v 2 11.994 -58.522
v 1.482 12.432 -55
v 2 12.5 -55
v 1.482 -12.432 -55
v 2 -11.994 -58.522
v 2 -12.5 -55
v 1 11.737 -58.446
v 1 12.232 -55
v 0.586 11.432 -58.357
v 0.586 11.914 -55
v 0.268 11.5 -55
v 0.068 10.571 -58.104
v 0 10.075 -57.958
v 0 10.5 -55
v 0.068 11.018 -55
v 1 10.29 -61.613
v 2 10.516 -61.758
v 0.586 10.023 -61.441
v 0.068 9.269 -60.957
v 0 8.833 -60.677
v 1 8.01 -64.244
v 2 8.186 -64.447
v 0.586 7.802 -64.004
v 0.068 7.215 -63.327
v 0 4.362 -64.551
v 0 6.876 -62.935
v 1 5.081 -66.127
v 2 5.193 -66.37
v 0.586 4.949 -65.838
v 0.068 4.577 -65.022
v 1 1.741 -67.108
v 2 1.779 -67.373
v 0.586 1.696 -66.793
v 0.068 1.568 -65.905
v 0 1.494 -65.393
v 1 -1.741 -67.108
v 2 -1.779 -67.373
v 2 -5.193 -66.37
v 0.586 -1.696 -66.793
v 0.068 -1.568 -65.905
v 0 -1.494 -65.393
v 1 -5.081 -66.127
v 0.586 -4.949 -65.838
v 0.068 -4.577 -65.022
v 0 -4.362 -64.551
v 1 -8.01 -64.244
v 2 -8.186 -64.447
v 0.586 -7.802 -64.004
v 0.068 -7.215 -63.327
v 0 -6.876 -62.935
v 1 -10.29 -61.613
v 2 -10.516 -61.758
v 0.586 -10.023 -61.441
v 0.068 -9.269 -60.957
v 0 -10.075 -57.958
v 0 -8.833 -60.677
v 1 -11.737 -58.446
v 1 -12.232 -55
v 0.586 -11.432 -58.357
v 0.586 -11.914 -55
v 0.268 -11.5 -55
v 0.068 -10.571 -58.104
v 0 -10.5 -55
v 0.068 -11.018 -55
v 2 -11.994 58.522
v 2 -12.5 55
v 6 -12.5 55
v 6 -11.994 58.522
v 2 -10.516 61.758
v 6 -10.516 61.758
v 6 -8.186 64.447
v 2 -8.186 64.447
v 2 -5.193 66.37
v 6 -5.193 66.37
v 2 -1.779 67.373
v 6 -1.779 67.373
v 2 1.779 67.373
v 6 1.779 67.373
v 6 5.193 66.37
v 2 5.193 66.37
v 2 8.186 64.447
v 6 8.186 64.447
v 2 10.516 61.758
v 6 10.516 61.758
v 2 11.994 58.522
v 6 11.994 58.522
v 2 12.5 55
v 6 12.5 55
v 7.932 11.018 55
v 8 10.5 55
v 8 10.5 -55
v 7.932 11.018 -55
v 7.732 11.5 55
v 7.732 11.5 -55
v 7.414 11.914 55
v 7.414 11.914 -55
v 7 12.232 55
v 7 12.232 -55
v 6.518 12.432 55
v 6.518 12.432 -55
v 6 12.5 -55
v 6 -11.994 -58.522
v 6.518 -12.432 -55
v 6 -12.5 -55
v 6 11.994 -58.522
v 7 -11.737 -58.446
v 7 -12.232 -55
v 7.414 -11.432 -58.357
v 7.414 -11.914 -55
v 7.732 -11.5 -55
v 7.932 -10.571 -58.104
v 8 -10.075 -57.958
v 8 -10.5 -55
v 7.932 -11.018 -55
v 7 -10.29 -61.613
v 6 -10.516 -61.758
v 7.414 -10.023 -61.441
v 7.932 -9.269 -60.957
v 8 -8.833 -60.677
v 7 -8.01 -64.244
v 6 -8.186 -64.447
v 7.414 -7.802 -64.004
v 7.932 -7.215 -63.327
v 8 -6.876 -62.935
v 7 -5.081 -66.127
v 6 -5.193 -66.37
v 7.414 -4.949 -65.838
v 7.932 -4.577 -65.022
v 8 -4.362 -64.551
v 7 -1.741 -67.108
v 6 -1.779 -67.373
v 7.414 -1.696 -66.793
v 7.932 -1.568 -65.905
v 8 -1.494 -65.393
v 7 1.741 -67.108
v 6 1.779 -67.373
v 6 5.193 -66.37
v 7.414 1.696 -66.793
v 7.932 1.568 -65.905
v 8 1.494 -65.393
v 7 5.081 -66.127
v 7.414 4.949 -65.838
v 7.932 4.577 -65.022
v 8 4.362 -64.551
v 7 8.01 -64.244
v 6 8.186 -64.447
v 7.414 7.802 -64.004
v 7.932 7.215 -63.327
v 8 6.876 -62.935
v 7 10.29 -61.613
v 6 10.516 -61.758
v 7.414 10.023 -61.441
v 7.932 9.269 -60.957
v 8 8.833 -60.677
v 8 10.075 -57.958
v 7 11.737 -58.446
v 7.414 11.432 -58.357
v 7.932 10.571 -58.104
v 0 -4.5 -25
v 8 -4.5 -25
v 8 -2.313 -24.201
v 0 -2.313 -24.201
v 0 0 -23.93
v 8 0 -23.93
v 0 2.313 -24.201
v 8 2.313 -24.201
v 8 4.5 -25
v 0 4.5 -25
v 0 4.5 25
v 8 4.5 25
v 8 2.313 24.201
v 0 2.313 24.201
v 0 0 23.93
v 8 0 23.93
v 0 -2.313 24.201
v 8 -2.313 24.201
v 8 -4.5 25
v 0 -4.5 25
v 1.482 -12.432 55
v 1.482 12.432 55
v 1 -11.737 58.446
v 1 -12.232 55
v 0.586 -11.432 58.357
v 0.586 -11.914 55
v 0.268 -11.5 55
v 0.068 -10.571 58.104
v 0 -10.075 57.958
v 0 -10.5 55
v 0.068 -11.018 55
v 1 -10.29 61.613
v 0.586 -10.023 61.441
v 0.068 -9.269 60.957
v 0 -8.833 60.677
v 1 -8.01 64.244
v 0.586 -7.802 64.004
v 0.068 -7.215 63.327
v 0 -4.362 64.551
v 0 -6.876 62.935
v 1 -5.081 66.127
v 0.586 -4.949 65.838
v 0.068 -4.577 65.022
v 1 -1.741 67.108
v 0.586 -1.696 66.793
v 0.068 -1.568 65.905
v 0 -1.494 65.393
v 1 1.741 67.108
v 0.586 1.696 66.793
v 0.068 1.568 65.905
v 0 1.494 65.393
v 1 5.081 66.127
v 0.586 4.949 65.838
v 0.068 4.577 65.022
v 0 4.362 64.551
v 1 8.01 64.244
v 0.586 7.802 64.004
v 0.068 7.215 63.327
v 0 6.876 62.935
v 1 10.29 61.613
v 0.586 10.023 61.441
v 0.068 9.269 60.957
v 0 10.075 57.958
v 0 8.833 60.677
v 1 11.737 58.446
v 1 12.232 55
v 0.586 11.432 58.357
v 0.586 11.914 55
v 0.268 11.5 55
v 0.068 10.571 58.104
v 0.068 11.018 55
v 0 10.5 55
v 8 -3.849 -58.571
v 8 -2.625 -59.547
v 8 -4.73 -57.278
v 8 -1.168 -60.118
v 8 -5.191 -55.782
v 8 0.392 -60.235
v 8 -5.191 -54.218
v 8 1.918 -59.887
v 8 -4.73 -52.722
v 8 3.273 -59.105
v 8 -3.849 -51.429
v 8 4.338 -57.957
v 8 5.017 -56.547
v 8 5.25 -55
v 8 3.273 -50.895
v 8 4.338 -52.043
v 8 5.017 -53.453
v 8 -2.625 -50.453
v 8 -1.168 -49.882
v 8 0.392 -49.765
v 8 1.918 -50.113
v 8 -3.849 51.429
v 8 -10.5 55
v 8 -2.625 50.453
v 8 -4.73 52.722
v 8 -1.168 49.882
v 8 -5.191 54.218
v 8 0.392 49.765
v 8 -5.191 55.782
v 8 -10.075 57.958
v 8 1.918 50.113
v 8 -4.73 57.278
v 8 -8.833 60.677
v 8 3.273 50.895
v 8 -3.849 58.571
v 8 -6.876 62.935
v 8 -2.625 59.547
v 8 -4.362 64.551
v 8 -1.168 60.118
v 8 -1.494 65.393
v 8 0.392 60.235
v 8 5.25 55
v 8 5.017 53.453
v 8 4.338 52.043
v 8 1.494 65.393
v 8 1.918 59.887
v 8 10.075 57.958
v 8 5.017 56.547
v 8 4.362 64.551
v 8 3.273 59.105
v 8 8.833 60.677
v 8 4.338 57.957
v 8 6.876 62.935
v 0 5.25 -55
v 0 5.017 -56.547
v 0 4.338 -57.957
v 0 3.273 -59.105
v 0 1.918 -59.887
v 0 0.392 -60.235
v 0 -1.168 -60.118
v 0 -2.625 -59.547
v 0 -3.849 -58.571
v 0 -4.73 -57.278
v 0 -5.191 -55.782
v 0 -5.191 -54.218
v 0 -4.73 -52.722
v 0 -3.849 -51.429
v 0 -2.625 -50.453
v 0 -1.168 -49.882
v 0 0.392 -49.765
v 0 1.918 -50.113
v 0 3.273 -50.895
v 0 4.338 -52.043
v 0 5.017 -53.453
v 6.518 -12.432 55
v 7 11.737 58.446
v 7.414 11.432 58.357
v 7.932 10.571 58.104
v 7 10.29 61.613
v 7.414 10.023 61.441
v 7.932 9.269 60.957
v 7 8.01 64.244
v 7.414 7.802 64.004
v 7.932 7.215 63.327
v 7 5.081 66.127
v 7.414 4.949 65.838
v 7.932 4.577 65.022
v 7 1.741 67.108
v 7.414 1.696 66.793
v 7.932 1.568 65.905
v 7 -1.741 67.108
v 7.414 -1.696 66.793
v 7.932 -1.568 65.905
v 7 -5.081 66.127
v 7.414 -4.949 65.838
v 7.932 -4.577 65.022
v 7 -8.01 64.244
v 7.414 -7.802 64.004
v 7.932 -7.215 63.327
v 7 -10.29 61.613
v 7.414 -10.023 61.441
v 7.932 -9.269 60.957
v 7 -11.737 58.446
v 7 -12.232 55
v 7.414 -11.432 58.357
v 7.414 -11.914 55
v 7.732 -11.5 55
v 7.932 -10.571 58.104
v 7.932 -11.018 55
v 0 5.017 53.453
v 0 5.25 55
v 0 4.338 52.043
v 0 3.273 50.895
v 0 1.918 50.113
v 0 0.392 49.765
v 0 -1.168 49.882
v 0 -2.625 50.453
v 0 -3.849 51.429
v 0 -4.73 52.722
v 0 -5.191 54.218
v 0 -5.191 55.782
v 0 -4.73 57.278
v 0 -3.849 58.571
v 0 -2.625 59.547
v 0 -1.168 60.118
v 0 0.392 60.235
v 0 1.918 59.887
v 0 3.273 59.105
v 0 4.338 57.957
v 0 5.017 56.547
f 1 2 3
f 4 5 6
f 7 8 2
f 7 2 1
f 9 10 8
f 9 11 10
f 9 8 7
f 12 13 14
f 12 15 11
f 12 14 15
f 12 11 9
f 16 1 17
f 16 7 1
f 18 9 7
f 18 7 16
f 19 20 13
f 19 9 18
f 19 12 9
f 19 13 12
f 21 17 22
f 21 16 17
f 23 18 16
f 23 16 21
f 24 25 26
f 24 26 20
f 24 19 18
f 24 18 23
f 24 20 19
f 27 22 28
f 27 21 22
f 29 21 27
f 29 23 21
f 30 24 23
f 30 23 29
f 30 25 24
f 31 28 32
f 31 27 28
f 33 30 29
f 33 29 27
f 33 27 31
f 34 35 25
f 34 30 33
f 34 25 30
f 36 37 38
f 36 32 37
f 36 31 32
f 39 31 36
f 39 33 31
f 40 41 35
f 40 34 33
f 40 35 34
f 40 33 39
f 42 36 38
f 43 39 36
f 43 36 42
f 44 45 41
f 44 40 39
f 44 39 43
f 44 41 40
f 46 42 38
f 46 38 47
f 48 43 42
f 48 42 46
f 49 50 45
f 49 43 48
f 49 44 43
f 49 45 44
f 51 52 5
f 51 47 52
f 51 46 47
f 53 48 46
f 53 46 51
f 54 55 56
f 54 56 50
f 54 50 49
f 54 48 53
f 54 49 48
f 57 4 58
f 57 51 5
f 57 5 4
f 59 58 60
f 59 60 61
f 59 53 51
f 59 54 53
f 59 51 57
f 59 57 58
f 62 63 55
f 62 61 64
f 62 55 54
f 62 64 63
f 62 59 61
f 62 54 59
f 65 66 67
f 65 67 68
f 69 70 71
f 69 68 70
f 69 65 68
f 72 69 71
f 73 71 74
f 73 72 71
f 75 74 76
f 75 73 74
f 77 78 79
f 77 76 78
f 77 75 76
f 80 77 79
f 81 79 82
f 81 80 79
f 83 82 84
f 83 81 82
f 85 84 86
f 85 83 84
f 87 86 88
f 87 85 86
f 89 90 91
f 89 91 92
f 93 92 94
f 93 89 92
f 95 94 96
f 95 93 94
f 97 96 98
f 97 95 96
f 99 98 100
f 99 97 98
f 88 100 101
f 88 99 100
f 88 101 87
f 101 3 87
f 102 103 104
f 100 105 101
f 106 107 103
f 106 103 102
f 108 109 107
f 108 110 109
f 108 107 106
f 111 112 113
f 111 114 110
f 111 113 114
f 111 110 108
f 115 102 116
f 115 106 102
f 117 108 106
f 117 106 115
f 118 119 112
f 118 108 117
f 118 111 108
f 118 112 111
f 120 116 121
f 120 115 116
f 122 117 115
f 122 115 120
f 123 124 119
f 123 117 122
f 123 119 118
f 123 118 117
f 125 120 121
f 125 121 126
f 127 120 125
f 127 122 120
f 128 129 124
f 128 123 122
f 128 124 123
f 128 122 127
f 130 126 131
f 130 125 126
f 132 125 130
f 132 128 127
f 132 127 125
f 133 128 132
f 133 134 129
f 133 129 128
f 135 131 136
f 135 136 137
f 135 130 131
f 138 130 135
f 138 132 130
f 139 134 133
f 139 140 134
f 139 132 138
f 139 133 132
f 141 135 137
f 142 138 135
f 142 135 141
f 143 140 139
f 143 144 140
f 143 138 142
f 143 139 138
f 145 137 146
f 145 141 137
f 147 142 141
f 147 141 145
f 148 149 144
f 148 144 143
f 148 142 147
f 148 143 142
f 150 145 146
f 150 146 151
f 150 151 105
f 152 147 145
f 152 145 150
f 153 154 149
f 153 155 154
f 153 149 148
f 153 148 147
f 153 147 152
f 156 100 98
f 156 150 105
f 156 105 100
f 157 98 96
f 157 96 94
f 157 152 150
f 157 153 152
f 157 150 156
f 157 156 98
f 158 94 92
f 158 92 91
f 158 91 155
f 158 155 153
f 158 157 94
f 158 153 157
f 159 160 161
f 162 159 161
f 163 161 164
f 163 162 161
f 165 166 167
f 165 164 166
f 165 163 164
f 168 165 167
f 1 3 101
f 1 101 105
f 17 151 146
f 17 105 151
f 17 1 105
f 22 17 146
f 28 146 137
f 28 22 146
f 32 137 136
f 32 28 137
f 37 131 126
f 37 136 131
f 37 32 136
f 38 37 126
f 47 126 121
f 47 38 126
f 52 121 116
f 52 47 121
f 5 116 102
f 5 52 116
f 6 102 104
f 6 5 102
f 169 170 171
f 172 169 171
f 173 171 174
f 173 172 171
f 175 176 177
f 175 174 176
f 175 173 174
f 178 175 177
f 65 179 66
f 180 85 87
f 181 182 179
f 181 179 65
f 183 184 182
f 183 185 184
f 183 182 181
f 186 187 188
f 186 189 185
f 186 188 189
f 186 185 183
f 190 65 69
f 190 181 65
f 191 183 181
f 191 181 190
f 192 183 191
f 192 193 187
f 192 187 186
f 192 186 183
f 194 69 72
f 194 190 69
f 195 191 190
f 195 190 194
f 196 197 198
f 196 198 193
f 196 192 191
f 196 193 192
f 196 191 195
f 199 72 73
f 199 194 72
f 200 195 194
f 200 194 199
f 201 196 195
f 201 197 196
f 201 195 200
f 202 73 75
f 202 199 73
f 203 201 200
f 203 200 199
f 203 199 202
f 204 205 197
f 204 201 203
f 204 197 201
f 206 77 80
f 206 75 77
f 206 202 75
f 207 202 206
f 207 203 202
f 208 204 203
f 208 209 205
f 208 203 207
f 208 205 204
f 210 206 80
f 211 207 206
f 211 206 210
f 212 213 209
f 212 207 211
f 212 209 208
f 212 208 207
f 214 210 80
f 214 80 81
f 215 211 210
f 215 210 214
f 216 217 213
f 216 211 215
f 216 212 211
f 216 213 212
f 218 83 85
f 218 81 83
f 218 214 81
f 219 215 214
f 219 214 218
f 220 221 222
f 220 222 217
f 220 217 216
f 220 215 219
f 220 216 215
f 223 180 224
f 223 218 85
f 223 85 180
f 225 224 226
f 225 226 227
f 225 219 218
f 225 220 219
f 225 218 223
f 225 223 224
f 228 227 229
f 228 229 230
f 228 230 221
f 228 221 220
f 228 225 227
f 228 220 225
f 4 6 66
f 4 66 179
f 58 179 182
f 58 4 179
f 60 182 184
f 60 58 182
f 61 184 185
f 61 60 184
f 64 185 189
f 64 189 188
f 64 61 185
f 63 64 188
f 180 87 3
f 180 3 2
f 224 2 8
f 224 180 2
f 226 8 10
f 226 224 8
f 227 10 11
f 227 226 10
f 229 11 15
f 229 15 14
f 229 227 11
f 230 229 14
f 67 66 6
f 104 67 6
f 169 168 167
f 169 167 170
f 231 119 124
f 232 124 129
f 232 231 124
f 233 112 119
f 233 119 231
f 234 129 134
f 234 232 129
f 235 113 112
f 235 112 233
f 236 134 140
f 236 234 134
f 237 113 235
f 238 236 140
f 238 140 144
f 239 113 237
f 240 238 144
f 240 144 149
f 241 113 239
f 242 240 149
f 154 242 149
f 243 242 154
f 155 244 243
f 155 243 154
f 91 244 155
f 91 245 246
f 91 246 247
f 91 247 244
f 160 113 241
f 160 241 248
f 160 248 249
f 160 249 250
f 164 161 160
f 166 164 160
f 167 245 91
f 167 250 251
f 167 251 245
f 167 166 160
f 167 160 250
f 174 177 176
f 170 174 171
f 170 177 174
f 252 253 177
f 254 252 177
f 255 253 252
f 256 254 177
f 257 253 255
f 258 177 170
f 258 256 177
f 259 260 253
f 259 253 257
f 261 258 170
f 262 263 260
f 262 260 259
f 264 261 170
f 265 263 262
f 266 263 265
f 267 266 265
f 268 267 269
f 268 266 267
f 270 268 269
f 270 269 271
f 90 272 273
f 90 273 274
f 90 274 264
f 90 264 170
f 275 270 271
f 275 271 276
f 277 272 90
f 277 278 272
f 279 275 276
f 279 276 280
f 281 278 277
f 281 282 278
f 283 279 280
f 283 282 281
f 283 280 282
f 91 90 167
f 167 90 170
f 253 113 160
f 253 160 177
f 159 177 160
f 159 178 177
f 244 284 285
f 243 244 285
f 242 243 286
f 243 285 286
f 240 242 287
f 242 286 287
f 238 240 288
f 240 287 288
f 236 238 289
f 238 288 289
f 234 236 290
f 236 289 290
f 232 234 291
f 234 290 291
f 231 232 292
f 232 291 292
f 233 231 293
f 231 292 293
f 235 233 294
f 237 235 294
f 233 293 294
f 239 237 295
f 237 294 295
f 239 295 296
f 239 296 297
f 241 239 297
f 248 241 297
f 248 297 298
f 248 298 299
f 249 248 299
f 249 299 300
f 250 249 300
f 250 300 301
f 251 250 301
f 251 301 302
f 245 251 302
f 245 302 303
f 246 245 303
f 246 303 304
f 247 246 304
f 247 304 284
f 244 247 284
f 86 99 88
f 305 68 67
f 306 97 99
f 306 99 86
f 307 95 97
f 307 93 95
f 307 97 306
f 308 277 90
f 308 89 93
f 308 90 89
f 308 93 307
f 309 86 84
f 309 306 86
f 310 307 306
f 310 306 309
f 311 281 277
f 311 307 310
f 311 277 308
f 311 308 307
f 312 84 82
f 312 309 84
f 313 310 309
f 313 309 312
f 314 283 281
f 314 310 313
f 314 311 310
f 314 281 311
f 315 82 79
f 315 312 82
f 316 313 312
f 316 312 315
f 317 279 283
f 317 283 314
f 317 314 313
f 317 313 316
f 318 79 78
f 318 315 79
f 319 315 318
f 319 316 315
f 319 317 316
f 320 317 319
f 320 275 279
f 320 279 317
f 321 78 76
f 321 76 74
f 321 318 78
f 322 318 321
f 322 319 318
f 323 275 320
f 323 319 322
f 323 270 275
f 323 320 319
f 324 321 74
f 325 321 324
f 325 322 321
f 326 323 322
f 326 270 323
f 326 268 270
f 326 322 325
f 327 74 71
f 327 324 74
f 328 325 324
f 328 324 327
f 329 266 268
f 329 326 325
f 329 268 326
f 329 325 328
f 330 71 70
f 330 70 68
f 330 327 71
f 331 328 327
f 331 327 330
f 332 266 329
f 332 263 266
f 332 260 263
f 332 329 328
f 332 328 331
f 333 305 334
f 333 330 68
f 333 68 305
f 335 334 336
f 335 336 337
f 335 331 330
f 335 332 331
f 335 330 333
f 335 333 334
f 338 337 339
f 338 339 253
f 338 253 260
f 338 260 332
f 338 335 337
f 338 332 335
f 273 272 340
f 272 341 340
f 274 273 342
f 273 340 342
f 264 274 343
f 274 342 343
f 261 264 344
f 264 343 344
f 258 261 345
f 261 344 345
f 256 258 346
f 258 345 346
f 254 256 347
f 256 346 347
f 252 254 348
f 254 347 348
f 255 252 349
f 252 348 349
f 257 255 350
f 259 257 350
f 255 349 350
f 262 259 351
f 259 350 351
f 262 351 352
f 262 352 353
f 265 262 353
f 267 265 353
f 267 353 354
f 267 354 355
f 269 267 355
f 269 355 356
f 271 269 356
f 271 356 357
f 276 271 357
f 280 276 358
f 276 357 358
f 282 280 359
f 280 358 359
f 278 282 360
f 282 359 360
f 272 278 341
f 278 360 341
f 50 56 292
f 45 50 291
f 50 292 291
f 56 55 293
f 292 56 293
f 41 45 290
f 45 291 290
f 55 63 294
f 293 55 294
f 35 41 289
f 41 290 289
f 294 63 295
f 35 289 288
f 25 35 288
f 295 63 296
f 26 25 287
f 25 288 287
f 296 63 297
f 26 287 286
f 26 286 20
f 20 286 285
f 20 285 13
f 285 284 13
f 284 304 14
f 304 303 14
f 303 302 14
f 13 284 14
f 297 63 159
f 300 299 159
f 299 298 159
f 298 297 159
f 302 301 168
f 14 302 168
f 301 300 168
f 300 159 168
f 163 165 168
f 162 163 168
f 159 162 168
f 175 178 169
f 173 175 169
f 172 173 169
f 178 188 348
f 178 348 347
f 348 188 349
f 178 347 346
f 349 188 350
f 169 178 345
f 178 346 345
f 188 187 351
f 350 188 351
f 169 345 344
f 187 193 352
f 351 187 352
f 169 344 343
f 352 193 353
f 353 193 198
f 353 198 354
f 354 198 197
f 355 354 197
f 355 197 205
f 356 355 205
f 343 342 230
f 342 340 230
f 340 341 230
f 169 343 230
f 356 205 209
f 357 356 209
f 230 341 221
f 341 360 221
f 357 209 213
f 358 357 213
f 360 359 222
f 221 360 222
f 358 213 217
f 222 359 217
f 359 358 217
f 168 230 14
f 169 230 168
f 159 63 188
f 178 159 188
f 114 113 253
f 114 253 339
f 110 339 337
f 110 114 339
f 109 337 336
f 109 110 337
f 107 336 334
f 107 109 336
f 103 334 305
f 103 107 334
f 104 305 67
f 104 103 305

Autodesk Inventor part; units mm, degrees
ref_plane "YZ Plane" through (0, 0, 0) normal (1, 0, 0) x (0, 1, 0)
ref_plane "XZ Plane" through (0, 0, 0) normal (0, 1, 0) x (-1, 0, 0)
ref_plane "XY Plane" through (0, 0, 0) normal (0, 0, 1) x (1, 0, 0)
sketch "Sketch1" plane through (0, 0, 0) normal (1, 0, 0) x (0, 1, 0)
  line L0 (12.5, 55) -> (-12.5, 55)
  line L1 (-12.5, 55) -> (-12.5, -55)
  line L2 (-12.5, -55) -> (12.5, -55)
  line L3 (12.5, -55) -> (12.5, 55)
  arc A0 (12.5, 55) -> (-12.5, 55) centre (0, 55) ccw
  arc A1 (-12.5, -55) -> (12.5, -55) centre (0, -55) ccw
  line L4 (4, 55) -> (-4, 55)
  circle A2 centre (0, 55) radius 5.25
  circle A3 centre (0, -55) radius 5.25
  line L5 (4.5, 25) -> (-4.5, 25)
  line L6 (-4.5, 25) -> (-4.5, -25)
  line L7 (-4.5, -25) -> (4.5, -25)
  line L8 (4.5, -25) -> (4.5, 25)
  line L9 (4.5, 25) -> (-4.5, -25) construction
  line L10 (-4.5, 25) -> (4.5, -25) construction
  arc A4 (4.5, -25) -> (-4.5, -25) centre (0, -33.9303) ccw
  arc A5 (-4.5, 25) -> (4.5, 25) centre (0, 33.9303) ccw
  point P0 (0, 0)
  point P1 (12.5, 0)
  dimension "d0" = 110
  dimension "d1" = 55
  dimension "d2" = 12.5
  dimension "d3" = 25
  dimension "d27" = 12.5
  dimension "d28" = 10.5
  dimension "d29" = 10.5
  dimension "d31" = 55
  dimension "d40" = 50
  dimension "d42" = 8
  dimension "d43" = 10
  dimension "d44" = 10
extrude "Extrusion1" add sketch "Sketch1" along normal blind 8 contours L3 L2 A3 L1 L0 A2 | L0 A2 A0 | A1 L2 A3 | A5 L5 | L7 A4
fillet "Fillet3" radius 2 8 edges at (8, 0, 67.5) (8, -12.5, 0) (8, 0, -67.5) (8, 12.5, 0) (0, 0, 67.5) (0, -12.5, 0) (0, 0, -67.5) (0, 12.5, 0)
equation "\"d0\" = FEMUR_LENGTH"
equation "\"d1\" = 0.5 * FEMUR_LENGTH"
equation "\"d2\" = 0.5 * FEMUR_WIDTH"
equation "\"d3\" = FEMUR_WIDTH"
equation "\"d31\" = 0.5 * FEMUR_LENGTH"
equation "\"d17\" = FEMUR_HEIGHT"
equation "\"d25\" = PART_FILLET"
equation "\"FEMUR_LENGTH\" = 110"
equation "\"FEMUR_WIDTH\" = 25"
equation "\"FEMUR_HEIGHT\" = 8"
equation "\"PART_FILLET\" = 2"
properties part number "FemurHornSide"
